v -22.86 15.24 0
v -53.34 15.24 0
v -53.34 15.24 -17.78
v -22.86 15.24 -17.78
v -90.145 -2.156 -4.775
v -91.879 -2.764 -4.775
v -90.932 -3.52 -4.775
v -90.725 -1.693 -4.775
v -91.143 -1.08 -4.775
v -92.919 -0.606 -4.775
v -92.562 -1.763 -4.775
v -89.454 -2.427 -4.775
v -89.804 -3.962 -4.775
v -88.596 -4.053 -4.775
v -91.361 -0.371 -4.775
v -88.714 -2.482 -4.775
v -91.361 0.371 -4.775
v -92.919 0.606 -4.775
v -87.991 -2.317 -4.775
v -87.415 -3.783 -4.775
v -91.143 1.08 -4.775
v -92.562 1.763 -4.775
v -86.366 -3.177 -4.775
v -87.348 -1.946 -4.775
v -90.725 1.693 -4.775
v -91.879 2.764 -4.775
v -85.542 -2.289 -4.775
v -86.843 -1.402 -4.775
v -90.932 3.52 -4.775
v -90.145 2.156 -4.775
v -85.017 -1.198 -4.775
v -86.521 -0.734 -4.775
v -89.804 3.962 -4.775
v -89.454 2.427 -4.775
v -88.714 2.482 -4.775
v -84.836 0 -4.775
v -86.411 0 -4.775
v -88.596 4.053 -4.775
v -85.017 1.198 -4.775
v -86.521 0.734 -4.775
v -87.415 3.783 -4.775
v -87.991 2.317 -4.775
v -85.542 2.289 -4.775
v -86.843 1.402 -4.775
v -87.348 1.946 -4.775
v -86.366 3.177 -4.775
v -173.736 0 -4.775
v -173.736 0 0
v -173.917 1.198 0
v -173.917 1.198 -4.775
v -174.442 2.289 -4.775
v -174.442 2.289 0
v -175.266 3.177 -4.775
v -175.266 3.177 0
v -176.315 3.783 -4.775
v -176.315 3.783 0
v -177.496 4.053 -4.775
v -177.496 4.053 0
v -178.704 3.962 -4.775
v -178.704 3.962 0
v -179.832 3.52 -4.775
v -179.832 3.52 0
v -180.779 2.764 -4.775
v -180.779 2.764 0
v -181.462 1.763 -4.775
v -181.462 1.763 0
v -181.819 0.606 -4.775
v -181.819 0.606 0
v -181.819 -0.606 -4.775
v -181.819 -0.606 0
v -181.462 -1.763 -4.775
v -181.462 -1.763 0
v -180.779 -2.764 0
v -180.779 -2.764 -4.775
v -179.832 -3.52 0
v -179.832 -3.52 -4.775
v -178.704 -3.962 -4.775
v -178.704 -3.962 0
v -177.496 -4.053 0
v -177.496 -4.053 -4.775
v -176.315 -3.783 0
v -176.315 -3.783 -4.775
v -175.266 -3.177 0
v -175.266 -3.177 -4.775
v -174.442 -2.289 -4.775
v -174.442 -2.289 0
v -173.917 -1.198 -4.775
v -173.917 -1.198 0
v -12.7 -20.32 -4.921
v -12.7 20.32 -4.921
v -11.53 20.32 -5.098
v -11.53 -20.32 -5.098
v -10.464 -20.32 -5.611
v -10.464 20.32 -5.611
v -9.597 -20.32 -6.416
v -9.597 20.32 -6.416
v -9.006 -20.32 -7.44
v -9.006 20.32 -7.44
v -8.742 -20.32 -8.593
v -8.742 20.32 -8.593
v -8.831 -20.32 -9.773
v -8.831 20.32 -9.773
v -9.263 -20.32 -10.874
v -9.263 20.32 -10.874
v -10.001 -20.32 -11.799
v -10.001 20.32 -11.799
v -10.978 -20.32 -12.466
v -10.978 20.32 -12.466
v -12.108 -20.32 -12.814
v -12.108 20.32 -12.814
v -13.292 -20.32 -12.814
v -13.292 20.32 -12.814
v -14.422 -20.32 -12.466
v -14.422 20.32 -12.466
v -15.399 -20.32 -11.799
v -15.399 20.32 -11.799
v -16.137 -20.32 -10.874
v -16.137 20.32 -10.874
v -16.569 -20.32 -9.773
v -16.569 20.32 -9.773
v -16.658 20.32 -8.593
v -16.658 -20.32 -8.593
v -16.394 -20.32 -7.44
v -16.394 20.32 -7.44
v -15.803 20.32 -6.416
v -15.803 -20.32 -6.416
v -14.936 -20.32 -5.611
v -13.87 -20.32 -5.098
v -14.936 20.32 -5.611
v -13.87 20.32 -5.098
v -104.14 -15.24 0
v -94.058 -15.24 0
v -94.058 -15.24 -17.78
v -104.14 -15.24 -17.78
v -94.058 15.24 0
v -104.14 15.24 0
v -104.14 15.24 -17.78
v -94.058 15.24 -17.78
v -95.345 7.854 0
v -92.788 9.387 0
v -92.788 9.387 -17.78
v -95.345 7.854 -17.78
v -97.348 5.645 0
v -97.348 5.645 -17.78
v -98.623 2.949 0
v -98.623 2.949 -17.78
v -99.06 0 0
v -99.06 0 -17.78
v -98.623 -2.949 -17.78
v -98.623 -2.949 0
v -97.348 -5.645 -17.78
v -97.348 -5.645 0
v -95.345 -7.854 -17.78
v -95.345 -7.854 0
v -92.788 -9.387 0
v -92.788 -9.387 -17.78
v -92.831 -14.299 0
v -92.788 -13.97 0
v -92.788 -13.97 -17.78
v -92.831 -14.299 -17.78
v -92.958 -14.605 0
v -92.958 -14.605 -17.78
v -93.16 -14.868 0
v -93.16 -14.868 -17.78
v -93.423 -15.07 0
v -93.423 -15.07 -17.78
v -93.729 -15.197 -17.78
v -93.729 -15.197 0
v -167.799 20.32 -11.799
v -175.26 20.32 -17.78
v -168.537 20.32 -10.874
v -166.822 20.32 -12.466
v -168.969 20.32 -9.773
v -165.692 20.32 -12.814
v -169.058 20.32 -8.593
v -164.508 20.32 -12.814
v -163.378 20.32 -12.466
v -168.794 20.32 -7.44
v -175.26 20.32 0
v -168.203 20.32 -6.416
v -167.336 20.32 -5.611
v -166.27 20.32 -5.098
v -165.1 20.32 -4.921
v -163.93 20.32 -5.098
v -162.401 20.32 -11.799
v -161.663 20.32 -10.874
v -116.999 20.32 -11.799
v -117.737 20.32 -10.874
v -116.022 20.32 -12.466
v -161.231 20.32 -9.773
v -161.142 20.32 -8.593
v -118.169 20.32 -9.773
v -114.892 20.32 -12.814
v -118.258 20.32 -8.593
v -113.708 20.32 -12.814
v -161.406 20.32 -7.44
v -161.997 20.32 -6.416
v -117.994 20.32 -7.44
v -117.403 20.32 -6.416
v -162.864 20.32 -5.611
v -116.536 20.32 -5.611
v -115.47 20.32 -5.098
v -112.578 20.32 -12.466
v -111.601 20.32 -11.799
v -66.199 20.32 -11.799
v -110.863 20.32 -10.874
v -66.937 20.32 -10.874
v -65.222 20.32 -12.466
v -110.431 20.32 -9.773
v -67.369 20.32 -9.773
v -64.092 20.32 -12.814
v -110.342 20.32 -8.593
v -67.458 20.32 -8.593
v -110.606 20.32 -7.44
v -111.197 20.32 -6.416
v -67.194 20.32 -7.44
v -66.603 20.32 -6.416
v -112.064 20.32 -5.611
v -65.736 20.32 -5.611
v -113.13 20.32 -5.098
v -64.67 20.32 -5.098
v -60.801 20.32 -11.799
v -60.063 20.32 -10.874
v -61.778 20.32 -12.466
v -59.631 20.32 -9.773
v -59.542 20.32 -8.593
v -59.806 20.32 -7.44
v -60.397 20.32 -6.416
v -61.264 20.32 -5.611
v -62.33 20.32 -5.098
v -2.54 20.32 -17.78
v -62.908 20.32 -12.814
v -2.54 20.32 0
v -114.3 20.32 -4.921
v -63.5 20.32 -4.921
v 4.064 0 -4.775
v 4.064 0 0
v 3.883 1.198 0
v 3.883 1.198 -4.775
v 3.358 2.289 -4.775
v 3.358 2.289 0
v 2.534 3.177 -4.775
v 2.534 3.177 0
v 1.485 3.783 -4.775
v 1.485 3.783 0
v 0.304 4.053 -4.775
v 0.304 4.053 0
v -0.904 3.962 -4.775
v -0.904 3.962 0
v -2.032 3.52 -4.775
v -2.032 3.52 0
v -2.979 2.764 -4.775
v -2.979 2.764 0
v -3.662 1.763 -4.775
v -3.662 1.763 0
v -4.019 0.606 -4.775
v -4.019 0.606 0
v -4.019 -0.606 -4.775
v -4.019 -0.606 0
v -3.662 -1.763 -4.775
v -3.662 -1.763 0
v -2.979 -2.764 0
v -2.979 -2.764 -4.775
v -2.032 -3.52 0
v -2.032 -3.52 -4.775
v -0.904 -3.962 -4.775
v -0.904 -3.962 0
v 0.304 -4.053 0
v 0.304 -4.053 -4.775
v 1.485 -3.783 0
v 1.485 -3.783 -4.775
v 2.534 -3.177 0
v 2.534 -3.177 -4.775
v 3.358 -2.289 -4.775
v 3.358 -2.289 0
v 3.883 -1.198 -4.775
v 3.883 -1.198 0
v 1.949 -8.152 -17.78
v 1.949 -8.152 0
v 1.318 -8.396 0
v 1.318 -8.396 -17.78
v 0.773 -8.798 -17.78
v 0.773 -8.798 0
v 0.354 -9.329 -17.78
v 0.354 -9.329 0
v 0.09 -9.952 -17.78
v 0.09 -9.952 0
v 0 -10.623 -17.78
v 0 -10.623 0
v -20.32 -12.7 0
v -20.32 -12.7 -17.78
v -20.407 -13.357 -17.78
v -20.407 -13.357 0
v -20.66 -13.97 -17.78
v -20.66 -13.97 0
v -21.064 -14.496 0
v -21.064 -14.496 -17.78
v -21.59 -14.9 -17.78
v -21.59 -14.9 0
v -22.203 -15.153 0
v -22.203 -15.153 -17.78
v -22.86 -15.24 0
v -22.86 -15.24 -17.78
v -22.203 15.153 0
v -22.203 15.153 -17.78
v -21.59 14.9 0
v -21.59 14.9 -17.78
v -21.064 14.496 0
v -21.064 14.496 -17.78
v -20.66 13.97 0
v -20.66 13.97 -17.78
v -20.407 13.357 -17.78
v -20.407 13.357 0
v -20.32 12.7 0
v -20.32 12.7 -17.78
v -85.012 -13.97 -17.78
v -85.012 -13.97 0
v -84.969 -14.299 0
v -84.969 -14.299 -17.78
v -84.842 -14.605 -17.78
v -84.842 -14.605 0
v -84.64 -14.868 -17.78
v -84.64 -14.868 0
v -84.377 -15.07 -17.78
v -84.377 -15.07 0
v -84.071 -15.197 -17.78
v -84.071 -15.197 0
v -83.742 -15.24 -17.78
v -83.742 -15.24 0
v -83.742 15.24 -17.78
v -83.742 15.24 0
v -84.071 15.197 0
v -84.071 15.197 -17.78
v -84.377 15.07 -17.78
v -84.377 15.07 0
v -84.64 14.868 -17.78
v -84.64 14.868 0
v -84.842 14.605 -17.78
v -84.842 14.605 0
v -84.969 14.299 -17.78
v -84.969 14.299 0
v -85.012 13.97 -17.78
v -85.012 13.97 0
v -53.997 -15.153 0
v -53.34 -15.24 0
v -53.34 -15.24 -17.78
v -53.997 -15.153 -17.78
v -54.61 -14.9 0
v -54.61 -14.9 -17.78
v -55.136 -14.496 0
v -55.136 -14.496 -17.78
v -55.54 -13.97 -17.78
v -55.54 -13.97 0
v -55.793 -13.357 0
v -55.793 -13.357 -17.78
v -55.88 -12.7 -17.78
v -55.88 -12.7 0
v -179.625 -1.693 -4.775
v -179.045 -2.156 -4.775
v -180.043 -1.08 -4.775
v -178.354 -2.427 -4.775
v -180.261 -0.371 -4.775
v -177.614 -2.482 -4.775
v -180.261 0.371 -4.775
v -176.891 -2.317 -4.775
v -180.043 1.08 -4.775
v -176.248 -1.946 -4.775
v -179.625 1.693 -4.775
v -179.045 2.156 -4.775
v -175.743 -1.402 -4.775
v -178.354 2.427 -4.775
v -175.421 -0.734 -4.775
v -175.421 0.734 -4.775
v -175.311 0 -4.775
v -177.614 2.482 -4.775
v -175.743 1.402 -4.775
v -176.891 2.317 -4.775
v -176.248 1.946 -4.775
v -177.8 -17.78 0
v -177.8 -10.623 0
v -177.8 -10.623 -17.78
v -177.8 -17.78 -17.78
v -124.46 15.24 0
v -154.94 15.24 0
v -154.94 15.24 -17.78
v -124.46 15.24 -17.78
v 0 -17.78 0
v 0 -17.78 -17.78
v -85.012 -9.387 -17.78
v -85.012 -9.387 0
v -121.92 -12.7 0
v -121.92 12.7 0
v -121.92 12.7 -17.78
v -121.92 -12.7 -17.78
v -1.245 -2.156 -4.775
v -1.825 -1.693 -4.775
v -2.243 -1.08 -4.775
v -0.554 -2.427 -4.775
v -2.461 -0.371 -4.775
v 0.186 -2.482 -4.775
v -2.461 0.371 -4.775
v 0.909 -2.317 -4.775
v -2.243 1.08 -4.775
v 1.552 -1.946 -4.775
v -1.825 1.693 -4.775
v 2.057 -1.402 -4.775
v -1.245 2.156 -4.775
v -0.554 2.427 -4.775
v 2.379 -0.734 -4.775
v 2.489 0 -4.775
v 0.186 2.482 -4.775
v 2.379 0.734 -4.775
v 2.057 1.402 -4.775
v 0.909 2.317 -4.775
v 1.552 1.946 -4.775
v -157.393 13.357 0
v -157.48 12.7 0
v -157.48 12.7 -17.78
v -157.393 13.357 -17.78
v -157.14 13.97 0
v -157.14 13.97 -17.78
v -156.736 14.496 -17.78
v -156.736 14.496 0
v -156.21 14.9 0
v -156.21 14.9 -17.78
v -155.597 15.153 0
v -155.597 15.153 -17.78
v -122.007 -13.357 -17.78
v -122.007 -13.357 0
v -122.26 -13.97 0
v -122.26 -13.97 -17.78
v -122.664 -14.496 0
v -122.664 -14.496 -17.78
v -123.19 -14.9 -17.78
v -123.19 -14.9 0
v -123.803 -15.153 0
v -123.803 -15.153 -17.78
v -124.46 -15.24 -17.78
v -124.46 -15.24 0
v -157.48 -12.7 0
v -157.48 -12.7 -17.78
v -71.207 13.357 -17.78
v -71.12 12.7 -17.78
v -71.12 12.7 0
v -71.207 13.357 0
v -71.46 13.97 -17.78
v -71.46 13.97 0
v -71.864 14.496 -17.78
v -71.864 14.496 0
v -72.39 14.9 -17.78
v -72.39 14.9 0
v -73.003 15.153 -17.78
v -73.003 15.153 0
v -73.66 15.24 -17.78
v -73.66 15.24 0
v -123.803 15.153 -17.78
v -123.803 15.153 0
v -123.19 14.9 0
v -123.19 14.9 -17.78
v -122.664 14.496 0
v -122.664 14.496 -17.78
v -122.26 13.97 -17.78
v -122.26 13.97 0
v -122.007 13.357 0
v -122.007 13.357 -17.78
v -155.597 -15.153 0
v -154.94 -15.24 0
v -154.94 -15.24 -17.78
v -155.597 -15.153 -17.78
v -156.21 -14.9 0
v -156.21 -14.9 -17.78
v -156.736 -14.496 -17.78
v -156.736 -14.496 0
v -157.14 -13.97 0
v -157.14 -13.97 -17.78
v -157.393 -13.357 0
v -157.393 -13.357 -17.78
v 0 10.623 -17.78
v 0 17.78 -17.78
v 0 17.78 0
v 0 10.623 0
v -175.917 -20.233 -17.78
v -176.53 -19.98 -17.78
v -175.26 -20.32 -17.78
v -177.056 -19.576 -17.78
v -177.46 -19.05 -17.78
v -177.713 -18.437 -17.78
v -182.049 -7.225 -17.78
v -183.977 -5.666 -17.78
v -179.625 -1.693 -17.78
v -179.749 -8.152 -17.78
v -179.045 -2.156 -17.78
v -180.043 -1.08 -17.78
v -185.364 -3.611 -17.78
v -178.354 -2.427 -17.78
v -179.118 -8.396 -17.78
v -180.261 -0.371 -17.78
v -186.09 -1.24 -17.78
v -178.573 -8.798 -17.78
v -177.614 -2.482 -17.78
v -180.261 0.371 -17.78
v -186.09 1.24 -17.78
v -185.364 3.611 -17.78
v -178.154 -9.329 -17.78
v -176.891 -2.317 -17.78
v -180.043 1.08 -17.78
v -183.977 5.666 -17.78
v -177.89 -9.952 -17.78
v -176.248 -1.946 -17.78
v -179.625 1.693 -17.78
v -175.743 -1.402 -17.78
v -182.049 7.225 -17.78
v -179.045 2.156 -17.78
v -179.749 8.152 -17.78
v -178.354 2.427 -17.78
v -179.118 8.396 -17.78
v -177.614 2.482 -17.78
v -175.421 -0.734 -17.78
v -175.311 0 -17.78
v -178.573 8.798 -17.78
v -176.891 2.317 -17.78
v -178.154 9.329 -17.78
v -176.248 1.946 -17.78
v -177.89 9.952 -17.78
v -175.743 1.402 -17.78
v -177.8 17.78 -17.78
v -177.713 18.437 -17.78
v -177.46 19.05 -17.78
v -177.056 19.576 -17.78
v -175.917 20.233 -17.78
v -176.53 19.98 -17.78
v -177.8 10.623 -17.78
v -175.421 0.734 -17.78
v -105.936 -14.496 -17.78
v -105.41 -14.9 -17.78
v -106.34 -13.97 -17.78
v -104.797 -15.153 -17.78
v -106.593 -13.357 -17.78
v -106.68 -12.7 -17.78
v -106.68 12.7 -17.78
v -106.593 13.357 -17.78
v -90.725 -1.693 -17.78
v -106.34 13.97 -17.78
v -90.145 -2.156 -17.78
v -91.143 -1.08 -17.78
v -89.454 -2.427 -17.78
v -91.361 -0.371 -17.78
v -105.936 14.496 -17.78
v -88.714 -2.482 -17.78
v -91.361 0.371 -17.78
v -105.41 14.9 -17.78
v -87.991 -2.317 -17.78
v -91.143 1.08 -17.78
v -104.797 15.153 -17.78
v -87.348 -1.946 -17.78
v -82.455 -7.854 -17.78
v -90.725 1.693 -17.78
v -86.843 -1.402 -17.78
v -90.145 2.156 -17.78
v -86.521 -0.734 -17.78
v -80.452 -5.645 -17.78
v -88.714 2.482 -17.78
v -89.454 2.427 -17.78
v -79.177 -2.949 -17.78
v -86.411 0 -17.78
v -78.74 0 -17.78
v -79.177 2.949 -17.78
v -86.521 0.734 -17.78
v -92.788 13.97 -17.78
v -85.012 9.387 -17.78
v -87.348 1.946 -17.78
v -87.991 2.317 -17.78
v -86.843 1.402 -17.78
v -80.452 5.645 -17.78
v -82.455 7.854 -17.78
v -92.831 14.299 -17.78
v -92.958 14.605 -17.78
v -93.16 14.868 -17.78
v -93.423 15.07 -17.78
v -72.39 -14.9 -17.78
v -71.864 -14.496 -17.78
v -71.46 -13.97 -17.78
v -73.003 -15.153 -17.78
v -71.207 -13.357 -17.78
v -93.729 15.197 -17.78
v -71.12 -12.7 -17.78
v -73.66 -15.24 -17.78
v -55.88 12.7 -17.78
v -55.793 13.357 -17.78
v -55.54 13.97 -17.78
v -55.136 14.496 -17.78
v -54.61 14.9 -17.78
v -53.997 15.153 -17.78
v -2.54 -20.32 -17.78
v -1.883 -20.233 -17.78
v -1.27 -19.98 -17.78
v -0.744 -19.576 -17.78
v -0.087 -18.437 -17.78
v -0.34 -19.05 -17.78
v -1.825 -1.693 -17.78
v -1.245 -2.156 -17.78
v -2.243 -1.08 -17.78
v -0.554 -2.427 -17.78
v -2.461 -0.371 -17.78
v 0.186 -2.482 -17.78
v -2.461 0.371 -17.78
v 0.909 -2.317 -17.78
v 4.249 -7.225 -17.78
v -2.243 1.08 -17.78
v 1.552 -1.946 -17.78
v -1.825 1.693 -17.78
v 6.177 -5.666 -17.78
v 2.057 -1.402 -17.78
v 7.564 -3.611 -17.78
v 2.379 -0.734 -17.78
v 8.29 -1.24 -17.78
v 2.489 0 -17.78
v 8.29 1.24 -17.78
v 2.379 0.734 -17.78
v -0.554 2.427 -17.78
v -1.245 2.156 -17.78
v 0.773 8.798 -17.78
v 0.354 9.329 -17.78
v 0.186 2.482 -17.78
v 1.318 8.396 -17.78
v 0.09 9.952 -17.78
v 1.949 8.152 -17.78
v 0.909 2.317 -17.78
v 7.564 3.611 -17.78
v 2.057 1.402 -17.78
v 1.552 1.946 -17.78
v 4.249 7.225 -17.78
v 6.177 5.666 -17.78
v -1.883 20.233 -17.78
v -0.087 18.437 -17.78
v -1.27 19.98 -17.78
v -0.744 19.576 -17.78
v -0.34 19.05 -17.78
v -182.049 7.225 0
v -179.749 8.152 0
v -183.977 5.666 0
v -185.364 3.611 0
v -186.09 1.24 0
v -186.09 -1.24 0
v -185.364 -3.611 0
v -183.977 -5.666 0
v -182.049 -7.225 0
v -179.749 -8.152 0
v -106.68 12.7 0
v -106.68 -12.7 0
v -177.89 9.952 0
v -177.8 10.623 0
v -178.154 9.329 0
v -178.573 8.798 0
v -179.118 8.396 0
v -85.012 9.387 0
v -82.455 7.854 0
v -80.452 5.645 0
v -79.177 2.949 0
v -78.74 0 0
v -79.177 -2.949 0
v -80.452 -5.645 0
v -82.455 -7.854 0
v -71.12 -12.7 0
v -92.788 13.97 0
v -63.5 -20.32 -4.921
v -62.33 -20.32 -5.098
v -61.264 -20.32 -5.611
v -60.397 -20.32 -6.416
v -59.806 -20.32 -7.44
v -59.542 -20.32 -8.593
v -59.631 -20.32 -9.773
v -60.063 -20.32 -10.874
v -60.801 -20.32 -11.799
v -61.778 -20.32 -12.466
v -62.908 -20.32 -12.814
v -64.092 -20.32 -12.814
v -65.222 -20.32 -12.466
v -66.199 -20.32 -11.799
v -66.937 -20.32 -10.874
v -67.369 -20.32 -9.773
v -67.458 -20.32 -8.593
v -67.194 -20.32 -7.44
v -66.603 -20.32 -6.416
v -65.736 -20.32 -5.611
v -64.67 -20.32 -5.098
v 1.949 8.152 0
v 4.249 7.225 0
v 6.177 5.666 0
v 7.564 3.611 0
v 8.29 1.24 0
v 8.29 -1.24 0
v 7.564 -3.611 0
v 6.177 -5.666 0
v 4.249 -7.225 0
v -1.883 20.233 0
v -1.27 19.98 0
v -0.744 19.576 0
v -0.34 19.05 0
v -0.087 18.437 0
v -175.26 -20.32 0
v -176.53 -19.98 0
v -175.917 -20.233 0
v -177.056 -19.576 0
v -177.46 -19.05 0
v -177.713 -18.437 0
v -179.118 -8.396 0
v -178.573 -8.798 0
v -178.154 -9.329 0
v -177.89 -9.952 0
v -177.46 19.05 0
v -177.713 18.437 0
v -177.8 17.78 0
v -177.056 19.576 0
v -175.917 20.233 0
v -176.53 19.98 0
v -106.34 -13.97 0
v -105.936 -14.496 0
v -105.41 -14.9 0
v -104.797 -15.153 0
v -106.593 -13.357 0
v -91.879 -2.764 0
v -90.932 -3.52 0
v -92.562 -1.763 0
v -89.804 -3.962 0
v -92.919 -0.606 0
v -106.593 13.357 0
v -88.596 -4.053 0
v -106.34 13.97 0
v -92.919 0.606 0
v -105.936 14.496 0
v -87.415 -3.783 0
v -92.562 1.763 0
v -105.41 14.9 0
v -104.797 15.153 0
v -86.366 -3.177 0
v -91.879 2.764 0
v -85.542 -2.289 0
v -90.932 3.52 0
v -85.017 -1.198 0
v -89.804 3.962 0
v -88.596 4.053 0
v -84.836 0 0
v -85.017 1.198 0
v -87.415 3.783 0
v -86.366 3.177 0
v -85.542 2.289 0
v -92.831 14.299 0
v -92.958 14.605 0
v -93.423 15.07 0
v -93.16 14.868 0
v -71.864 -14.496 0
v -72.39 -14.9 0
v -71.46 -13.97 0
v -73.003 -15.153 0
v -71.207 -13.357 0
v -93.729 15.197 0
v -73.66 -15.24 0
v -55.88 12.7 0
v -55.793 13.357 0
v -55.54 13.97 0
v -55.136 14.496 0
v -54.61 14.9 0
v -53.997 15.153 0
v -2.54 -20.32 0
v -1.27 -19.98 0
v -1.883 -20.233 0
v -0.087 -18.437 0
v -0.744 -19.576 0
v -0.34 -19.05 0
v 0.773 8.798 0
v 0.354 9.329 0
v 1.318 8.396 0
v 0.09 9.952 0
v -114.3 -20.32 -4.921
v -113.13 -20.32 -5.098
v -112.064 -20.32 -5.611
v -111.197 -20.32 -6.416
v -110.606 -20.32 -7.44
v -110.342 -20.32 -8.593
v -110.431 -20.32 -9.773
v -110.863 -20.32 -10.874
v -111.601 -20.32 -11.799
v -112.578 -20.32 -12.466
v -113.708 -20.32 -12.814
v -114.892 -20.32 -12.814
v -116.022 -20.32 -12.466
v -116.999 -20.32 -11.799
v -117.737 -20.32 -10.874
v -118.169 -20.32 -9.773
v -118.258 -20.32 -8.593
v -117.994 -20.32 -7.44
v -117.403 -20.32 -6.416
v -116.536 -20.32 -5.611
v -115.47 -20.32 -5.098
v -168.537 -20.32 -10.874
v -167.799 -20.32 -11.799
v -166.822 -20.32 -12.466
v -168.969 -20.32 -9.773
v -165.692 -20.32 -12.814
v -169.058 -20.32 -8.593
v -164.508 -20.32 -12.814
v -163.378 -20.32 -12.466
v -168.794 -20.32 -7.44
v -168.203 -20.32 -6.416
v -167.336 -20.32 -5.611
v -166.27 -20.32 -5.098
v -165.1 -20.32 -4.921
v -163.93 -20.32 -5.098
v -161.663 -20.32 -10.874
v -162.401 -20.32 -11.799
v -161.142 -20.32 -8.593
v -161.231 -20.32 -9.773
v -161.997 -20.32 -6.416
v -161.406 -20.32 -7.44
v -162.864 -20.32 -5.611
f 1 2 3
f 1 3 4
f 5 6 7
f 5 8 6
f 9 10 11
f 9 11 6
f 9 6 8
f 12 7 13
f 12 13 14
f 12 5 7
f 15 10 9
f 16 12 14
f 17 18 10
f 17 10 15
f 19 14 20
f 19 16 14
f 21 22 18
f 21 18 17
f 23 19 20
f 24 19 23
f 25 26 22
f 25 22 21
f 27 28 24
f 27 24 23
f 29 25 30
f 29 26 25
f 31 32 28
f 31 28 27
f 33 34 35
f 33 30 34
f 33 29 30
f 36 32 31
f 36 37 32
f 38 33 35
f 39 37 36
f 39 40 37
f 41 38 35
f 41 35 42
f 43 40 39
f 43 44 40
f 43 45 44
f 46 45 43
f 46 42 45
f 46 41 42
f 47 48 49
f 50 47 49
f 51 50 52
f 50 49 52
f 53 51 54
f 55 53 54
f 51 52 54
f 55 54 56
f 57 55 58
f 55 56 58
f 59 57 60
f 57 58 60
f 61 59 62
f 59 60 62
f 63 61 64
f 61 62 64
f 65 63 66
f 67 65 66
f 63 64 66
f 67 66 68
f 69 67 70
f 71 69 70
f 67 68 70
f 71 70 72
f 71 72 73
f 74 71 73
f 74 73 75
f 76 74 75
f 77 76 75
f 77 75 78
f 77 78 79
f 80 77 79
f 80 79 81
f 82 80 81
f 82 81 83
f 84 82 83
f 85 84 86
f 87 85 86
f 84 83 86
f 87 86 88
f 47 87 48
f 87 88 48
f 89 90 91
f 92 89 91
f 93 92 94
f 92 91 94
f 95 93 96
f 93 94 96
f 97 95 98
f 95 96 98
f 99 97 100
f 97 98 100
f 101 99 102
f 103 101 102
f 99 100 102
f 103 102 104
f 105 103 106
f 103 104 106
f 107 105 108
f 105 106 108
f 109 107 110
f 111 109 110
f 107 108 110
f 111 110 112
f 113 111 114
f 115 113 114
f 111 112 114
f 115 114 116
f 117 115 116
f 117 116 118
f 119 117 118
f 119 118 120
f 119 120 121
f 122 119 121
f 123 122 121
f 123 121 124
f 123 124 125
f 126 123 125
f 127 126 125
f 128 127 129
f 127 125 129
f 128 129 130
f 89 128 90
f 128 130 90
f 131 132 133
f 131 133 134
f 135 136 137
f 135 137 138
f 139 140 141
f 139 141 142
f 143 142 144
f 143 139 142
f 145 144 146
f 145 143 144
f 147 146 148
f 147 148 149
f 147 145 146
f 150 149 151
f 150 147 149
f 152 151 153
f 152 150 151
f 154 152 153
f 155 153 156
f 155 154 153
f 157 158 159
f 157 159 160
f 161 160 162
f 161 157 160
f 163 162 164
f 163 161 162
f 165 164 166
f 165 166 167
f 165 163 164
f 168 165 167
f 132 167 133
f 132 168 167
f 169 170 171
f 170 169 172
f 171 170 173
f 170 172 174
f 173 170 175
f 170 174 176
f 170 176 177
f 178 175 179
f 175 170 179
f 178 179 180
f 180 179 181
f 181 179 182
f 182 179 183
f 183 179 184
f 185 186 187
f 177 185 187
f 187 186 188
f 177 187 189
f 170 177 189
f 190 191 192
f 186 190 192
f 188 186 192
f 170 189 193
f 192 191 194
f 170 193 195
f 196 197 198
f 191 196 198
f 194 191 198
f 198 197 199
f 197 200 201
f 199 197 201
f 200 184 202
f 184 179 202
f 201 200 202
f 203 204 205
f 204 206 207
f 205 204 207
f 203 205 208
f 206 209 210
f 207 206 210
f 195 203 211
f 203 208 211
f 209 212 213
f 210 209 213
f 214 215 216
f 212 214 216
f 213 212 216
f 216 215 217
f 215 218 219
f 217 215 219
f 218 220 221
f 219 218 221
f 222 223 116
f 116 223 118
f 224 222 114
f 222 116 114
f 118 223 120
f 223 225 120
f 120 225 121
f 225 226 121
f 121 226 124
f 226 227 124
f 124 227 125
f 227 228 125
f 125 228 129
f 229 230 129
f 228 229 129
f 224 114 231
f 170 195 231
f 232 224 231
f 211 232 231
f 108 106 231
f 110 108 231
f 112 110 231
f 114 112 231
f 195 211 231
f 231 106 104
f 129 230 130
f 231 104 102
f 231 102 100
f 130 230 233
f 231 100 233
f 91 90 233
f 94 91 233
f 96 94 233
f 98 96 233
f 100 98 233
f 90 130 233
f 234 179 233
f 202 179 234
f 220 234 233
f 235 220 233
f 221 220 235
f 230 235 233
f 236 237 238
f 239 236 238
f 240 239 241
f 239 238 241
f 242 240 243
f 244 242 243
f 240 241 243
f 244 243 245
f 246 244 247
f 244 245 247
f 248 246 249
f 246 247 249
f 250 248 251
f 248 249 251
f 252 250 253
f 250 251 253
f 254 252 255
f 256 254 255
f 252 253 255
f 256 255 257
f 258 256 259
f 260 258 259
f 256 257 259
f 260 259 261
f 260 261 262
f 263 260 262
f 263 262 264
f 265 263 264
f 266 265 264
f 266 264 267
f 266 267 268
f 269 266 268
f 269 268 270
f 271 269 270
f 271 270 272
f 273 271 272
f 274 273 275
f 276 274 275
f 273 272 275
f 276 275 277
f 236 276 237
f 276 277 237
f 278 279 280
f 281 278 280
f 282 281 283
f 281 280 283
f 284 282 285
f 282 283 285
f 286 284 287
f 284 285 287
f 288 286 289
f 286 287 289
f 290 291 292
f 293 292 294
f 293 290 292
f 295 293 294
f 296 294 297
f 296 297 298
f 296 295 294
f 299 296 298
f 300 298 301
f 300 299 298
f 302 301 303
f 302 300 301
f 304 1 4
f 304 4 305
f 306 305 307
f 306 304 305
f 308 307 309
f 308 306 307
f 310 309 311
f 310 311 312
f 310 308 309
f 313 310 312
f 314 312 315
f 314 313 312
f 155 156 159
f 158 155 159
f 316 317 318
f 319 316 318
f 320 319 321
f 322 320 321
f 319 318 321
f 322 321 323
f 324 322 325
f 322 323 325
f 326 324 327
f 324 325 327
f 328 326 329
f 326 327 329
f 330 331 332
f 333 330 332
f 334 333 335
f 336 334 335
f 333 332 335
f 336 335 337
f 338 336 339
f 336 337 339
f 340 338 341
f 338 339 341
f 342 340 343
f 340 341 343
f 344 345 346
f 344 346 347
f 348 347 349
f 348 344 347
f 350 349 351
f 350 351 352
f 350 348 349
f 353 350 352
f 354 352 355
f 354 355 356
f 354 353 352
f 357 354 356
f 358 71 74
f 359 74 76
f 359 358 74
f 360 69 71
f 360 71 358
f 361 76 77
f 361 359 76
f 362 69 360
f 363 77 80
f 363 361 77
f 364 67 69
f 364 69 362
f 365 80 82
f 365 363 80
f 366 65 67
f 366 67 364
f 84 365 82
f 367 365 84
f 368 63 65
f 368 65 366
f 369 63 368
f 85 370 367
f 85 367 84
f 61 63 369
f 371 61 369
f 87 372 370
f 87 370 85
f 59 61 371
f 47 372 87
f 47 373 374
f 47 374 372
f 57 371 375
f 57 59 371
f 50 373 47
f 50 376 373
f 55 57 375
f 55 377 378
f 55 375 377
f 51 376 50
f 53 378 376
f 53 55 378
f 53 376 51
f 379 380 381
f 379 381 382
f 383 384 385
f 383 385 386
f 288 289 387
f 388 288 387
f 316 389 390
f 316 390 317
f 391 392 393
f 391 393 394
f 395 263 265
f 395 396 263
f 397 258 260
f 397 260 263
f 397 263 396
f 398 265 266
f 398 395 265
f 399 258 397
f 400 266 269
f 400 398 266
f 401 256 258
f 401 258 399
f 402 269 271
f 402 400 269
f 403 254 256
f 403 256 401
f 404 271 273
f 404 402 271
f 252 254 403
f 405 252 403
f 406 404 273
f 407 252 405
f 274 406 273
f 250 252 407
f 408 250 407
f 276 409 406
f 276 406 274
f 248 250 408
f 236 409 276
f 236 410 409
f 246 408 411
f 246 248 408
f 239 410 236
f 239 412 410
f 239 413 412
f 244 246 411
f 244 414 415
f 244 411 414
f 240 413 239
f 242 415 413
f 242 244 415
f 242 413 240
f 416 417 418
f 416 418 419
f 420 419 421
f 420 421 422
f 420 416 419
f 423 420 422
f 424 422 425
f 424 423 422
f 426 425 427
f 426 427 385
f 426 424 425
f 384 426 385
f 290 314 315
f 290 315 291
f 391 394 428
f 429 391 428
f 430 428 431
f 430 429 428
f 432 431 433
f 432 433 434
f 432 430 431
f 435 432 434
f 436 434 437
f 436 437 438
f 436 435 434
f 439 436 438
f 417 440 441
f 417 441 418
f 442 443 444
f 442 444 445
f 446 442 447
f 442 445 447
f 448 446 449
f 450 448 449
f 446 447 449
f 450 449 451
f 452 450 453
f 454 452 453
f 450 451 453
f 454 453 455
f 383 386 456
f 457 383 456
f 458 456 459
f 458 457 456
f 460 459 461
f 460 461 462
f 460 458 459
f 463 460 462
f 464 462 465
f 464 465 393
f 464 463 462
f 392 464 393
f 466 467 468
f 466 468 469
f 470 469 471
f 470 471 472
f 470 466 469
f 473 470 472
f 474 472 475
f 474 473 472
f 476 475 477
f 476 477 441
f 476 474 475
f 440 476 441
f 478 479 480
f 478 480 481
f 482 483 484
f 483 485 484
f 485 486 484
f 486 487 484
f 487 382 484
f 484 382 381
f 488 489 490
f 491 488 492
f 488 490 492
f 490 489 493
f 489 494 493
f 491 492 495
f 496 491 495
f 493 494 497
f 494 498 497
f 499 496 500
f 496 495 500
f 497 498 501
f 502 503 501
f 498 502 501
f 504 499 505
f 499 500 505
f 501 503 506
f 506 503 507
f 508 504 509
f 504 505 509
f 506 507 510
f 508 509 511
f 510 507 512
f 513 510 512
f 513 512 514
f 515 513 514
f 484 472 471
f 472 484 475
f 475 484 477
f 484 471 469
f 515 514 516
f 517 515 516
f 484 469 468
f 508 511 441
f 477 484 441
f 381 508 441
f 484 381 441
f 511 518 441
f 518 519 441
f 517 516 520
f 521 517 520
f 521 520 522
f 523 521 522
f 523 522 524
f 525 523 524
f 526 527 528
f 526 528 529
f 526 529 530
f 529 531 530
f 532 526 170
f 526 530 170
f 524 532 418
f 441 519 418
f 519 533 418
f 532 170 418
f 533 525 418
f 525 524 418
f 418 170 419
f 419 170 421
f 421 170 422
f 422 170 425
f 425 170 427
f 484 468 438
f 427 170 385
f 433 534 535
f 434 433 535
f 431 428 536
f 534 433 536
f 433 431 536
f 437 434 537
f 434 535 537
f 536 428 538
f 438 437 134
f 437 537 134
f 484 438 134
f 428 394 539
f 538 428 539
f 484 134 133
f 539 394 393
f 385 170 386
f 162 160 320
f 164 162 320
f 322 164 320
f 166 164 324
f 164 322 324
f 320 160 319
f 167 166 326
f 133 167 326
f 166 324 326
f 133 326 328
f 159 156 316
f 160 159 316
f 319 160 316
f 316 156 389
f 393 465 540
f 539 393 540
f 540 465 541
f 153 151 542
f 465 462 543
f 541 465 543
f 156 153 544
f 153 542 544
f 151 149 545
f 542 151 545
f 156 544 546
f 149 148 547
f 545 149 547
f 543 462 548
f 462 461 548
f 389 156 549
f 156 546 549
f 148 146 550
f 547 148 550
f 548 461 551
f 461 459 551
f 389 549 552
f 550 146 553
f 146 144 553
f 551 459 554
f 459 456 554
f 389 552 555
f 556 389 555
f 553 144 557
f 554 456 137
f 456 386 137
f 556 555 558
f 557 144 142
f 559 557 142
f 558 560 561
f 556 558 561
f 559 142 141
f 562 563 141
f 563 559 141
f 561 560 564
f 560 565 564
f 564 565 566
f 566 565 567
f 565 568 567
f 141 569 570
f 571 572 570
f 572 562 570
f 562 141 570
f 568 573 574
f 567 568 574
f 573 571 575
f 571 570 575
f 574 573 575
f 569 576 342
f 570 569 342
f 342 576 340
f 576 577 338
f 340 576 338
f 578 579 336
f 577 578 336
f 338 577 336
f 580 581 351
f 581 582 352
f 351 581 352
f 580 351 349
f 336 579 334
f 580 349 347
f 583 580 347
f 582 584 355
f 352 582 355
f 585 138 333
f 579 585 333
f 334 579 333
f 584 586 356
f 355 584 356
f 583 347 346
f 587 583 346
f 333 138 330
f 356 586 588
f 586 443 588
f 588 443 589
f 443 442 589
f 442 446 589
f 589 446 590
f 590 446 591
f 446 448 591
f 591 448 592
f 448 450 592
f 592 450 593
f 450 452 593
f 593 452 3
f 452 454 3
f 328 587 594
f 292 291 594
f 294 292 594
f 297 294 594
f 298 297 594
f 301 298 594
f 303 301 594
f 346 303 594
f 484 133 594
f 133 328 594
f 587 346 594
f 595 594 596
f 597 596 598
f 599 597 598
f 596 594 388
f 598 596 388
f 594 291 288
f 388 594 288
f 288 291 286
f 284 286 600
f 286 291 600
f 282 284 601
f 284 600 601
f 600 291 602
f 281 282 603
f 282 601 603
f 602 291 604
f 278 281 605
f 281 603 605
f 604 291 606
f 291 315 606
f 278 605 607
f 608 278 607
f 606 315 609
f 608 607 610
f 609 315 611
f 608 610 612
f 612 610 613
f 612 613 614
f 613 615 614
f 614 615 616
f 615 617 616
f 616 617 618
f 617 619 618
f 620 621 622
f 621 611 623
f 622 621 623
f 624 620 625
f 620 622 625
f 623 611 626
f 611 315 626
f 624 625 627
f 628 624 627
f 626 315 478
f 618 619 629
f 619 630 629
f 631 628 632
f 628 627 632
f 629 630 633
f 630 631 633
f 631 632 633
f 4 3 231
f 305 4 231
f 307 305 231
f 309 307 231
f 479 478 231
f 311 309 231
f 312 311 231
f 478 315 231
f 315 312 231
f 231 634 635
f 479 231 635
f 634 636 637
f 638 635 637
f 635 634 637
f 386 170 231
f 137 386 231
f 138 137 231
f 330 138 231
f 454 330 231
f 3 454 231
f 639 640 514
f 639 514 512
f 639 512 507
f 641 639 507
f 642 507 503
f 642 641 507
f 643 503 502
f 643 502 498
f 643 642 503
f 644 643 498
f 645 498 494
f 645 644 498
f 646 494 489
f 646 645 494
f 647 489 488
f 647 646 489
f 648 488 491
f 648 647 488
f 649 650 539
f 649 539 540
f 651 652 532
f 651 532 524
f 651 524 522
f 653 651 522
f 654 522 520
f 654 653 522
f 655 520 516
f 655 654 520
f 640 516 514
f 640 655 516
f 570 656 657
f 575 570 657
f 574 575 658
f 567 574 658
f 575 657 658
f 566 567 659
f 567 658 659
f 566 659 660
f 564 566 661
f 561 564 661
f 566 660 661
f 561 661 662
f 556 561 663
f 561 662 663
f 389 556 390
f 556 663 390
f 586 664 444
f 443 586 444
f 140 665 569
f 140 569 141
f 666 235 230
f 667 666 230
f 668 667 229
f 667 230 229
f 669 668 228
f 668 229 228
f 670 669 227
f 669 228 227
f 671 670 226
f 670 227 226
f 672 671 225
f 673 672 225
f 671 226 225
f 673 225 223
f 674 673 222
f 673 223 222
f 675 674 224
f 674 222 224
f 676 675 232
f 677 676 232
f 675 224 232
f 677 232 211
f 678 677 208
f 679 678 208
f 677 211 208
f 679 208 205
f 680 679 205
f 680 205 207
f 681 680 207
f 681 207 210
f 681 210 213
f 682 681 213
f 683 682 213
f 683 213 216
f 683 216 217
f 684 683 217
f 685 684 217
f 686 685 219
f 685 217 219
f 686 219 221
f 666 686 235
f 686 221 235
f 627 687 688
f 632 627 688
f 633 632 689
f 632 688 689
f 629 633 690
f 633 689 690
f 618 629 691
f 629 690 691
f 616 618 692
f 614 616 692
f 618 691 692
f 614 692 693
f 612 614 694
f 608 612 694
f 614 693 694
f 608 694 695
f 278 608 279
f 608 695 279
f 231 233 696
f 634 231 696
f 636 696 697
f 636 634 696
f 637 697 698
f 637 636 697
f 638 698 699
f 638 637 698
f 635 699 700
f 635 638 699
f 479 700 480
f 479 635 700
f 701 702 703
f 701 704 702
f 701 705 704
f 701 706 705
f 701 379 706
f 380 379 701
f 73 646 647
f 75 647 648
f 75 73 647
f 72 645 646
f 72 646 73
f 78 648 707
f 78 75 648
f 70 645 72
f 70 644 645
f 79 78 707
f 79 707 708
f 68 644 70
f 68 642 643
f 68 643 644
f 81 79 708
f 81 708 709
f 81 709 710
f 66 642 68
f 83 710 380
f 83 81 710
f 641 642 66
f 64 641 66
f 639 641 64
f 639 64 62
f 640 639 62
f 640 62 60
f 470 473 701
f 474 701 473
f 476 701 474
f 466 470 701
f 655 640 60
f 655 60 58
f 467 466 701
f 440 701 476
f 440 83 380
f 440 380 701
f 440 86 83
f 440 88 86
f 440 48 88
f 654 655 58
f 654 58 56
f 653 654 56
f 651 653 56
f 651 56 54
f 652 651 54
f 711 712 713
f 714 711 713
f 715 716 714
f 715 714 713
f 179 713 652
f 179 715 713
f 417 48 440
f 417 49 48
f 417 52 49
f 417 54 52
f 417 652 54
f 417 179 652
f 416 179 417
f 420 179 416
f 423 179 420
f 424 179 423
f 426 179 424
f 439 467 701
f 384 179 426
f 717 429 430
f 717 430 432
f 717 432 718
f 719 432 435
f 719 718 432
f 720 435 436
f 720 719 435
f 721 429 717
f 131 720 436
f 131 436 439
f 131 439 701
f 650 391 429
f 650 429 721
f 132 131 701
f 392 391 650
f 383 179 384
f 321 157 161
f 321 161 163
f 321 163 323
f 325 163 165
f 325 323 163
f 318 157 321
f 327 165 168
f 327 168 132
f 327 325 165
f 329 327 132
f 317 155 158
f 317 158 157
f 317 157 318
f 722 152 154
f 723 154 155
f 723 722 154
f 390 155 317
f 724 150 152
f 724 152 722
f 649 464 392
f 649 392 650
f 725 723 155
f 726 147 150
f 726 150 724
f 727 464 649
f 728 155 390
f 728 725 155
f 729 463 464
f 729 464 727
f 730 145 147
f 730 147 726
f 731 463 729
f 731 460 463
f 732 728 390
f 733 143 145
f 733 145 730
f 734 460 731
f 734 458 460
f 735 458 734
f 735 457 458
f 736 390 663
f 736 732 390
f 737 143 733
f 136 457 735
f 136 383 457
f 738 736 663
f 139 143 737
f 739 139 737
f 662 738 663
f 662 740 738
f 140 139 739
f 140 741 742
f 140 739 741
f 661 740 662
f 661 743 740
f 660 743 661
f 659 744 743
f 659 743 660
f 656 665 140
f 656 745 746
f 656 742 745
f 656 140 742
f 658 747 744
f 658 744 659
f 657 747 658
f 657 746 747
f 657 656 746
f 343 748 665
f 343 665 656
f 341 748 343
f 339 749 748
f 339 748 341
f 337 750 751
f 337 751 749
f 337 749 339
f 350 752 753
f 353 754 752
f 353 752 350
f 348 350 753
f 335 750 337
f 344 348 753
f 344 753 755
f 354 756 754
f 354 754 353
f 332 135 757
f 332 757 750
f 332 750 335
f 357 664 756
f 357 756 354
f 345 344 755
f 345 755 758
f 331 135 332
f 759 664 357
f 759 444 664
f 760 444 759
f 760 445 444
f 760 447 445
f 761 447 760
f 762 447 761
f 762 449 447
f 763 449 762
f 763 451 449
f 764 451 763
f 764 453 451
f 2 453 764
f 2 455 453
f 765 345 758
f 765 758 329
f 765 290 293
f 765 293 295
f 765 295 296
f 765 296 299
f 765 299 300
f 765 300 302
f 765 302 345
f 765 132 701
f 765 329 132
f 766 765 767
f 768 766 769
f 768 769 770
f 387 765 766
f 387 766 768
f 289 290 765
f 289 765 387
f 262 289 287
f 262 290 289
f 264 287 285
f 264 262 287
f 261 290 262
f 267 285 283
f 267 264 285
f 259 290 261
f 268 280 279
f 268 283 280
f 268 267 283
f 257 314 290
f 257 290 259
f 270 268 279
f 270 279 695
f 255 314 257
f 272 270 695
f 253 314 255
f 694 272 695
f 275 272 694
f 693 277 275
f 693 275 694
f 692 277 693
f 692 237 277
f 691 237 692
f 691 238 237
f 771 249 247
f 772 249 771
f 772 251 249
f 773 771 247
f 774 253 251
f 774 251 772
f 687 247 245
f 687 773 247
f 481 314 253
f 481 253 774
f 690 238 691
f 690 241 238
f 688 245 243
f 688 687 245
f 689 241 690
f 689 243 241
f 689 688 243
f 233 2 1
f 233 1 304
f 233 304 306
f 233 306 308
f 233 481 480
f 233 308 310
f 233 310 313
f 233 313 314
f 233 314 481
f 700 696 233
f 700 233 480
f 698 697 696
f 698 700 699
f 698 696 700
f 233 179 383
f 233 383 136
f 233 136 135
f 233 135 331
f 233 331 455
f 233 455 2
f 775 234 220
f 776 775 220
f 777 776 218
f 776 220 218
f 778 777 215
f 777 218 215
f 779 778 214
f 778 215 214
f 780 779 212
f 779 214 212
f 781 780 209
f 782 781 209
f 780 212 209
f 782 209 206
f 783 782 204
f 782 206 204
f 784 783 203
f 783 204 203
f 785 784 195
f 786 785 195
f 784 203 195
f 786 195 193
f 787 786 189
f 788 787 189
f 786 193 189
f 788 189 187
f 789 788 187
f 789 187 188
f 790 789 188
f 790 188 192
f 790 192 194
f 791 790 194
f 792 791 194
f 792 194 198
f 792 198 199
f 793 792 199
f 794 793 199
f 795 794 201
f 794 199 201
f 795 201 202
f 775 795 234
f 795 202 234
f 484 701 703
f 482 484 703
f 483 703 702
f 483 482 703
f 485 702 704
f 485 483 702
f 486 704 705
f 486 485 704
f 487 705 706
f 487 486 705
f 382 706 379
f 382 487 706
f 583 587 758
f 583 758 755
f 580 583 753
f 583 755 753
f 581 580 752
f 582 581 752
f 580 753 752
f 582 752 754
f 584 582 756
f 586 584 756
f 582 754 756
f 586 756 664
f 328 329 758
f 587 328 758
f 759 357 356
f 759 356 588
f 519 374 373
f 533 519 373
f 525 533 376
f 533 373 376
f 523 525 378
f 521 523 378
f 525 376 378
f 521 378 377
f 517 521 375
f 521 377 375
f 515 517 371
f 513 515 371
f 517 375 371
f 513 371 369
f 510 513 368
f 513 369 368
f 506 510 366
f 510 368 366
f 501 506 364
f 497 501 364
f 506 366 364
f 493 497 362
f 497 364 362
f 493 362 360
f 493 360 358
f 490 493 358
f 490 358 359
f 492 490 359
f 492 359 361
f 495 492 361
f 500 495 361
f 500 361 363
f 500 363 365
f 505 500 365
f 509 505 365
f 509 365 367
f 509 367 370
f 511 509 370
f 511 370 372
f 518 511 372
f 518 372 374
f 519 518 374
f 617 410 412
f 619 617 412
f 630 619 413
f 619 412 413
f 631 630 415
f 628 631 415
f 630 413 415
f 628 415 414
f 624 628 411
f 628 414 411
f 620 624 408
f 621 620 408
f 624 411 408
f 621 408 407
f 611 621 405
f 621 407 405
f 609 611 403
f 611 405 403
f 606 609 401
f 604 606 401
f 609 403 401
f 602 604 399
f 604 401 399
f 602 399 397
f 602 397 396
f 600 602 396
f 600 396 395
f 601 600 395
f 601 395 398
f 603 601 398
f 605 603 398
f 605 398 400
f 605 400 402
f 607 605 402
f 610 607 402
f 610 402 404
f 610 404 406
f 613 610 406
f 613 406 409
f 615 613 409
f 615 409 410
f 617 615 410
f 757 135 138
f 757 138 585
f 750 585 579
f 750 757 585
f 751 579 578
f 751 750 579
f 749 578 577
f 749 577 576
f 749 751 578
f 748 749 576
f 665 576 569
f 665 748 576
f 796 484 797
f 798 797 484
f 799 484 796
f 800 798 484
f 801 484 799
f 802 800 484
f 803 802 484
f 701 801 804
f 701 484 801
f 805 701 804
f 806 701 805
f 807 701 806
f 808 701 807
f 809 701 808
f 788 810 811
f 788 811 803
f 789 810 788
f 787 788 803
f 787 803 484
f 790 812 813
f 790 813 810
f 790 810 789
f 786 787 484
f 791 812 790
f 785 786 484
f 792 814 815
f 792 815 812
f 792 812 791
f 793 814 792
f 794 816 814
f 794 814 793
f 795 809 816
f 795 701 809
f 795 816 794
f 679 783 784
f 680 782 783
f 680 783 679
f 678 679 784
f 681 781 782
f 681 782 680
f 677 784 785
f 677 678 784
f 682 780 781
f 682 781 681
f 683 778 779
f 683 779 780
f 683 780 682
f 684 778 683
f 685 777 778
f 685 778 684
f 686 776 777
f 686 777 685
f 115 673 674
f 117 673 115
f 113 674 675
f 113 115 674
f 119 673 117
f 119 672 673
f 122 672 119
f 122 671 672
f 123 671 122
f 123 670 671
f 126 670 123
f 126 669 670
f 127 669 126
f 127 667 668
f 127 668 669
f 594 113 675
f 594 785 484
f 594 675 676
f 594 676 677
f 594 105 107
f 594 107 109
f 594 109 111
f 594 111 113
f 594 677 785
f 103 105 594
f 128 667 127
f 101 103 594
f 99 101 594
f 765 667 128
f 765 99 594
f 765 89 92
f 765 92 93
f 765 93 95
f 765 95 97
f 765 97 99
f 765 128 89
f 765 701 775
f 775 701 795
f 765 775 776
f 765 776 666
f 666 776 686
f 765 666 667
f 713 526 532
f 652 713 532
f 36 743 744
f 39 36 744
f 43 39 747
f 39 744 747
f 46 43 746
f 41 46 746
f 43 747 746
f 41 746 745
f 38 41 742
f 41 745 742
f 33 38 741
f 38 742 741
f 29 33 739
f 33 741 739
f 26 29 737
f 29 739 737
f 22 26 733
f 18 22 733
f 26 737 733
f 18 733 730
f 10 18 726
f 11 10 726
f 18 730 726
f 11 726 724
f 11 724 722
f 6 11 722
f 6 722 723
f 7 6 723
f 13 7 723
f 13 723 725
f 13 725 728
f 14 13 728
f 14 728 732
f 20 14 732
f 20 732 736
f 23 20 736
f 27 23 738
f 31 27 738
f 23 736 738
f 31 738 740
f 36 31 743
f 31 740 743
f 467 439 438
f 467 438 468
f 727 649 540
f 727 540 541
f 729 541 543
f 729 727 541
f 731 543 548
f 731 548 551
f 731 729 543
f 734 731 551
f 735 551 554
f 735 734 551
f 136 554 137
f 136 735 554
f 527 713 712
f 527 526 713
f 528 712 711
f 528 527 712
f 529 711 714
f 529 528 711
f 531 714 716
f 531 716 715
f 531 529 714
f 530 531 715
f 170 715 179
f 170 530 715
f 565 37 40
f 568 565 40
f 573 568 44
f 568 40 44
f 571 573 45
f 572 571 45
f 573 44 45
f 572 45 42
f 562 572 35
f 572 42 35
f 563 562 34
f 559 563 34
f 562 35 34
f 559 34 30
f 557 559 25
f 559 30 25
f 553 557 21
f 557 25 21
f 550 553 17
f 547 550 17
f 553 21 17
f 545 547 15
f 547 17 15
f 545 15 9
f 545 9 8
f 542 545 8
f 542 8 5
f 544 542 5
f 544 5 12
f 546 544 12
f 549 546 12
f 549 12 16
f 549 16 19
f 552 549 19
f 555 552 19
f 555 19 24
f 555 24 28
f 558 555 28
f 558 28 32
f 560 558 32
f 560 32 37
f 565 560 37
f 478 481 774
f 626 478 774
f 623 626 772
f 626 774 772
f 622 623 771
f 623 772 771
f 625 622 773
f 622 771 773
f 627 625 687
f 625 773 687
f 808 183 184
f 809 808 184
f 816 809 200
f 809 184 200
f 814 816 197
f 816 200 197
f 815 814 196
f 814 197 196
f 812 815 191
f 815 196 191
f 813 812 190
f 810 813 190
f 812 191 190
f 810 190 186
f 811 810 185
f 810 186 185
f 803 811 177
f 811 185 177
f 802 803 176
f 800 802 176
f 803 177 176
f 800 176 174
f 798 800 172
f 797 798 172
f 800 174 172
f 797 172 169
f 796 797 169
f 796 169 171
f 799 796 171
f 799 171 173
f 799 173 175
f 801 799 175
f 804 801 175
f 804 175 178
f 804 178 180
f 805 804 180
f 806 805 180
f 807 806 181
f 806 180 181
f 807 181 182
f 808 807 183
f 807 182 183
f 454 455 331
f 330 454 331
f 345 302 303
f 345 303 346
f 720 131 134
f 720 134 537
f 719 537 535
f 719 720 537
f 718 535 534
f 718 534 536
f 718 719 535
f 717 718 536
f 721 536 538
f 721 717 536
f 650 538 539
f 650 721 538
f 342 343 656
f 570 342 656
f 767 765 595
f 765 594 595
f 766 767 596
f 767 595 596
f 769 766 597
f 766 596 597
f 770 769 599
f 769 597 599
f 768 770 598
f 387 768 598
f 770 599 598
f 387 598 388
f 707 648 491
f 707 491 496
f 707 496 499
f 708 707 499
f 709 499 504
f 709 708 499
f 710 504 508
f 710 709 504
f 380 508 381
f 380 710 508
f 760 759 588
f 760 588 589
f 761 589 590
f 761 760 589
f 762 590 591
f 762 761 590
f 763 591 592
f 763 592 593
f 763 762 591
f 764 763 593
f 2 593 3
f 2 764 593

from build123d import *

# Parameters (mm, degrees)
SKETCH1_W           = 195.2625
SKETCH1_H           = 40.64
SKETCH1_R           = 2.4892
BOSS_EXTRUDE1_DEPTH = 17.78
SKETCH2_R           = 3.96875
CUT_EXTRUDE1_DEPTH  = 40.64
SKETCH3_R           = 4.064
CUT_EXTRUDE2_DEPTH  = 4.7752
CUT_EXTRUDE3_DEPTH  = 17.78
FILLET1_R           = 2.54


with BuildPart() as part:
    # Sketch1 → Boss-Extrude1 (new body)
    with BuildSketch(Plane.XY):
        with Locations((-88.9, 0)):
            Rectangle(SKETCH1_W, SKETCH1_H)
        Circle(SKETCH1_R, mode=Mode.SUBTRACT)
        with Locations((-177.8, 0)):
            Circle(SKETCH1_R, mode=Mode.SUBTRACT)
        with Locations((-88.9, 0)):
            Circle(SKETCH1_R, mode=Mode.SUBTRACT)
    extrude(amount=-BOSS_EXTRUDE1_DEPTH)

    # Sketch2 → Cut-Extrude1 (cut)
    with BuildSketch(Plane(origin=(0, 20.32, 0), x_dir=(1, 0, 0), z_dir=(0, 1, 0))):
        with Locations(Location((-12.7, 8.89, 0), (0, 0, 270))):
            Circle(SKETCH2_R)
        with Locations(Location((-63.5, 8.89, 0), (0, 0, 270))):
            Circle(SKETCH2_R)
        with Locations(Location((-114.3, 8.89, 0), (0, 0, 270))):
            Circle(SKETCH2_R)
        with Locations(Location((-165.1, 8.89, 0), (0, 0, 270))):
            Circle(SKETCH2_R)
    extrude(amount=-CUT_EXTRUDE1_DEPTH, mode=Mode.SUBTRACT)

    # Sketch3 → Cut-Extrude2 (cut)
    with BuildSketch(Plane.XY):
        Circle(SKETCH3_R)
        with Locations((-88.9, 0)):
            Circle(SKETCH3_R)
        with Locations((-177.8, 0)):
            Circle(SKETCH3_R)
    extrude(amount=-CUT_EXTRUDE2_DEPTH, mode=Mode.SUBTRACT)

    # Sketch5 → Cut-Extrude3 (cut)
    with BuildSketch(Plane.XY):
        with BuildLine():
            Line((0, -20.32), (8.73125, -20.32))
            Line((8.73125, -20.32), (8.73125, 20.32))
            Line((8.73125, 20.32), (0, 20.32))
            Line((0, 20.32), (0, 10.622546022))
            ThreePointArc((0, 10.622546022), (0.546012526, 9.049137635), (1.949302326, 8.152186482))
            ThreePointArc((1.949302326, 8.152186482), (8.382, 0), (1.949302326, -8.152186482))
            ThreePointArc((1.949302326, -8.152186482), (0.546012526, -9.049137635), (0, -10.622546022))
            Line((0, -10.622546022), (0, -20.32))
        make_face()
        with BuildLine():
            Line((-22.86, -15.24), (-53.34, -15.24))
            ThreePointArc((-53.34, -15.24), (-55.136051224, -14.496051224), (-55.88, -12.7))
            Line((-55.88, -12.7), (-55.88, 12.7))
            ThreePointArc((-55.88, 12.7), (-55.136051224, 14.496051224), (-53.34, 15.24))
            Line((-53.34, 15.24), (-22.86, 15.24))
            ThreePointArc((-22.86, 15.24), (-21.063948776, 14.496051224), (-20.32, 12.7))
            Line((-20.32, 12.7), (-20.32, -12.7))
            ThreePointArc((-20.32, -12.7), (-21.063948776, -14.496051224), (-22.86, -15.24))
        make_face()
        with BuildLine():
            Line((-85.011936327, -9.38661605), (-85.011936327, -13.97))
            ThreePointArc((-85.011936327, -13.97), (-84.639961939, -14.868025612), (-83.741936327, -15.24))
            Line((-83.741936327, -15.24), (-73.66, -15.24))
            ThreePointArc((-73.66, -15.24), (-71.863948776, -14.496051224), (-71.12, -12.7))
            Line((-71.12, -12.7), (-71.12, 12.7))
            ThreePointArc((-71.12, 12.7), (-71.863948776, 14.496051224), (-73.66, 15.24))
            Line((-73.66, 15.24), (-83.741936327, 15.24))
            ThreePointArc((-83.741936327, 15.24), (-84.639961939, 14.868025612), (-85.011936327, 13.97))
            Line((-85.011936327, 13.97), (-85.011936327, 9.38661605))
            ThreePointArc((-85.011936327, 9.38661605), (-78.74, 0), (-85.011936327, -9.38661605))
        make_face()
        with BuildLine():
            Line((-104.14, 15.24), (-94.058063673, 15.24))
            ThreePointArc((-94.058063673, 15.24), (-93.160038061, 14.868025612), (-92.788063673, 13.97))
            Line((-92.788063673, 13.97), (-92.788063673, 9.38661605))
            ThreePointArc((-92.788063673, 9.38661605), (-99.06, 0), (-92.788063673, -9.38661605))
            Line((-92.788063673, -9.38661605), (-92.788063673, -13.97))
            ThreePointArc((-92.788063673, -13.97), (-93.160038061, -14.868025612), (-94.058063673, -15.24))
            Line((-94.058063673, -15.24), (-104.14, -15.24))
            ThreePointArc((-104.14, -15.24), (-105.936051224, -14.496051224), (-106.68, -12.7))
            Line((-106.68, -12.7), (-106.68, 12.7))
            ThreePointArc((-106.68, 12.7), (-105.936051224, 14.496051224), (-104.14, 15.24))
        make_face()
        with BuildLine():
            Line((-154.94, 15.24), (-124.46, 15.24))
            ThreePointArc((-124.46, 15.24), (-122.663948776, 14.496051224), (-121.92, 12.7))
            Line((-121.92, 12.7), (-121.92, -12.7))
            ThreePointArc((-121.92, -12.7), (-122.663948776, -14.496051224), (-124.46, -15.24))
            Line((-124.46, -15.24), (-154.94, -15.24))
            ThreePointArc((-154.94, -15.24), (-156.736051224, -14.496051224), (-157.48, -12.7))
            Line((-157.48, -12.7), (-157.48, 12.7))
            ThreePointArc((-157.48, 12.7), (-156.736051224, 14.496051224), (-154.94, 15.24))
        make_face()
        with BuildLine():
            Line((-186.53125, -20.32), (-186.53125, 20.32))
            Line((-186.53125, 20.32), (-177.8, 20.32))
            Line((-177.8, 20.32), (-177.8, 10.622546022))
            ThreePointArc((-177.8, 10.622546022), (-178.346012526, 9.049137635), (-179.749302326, 8.152186482))
            ThreePointArc((-179.749302326, 8.152186482), (-186.182, 0), (-179.749302326, -8.152186482))
            ThreePointArc((-179.749302326, -8.152186482), (-178.346012526, -9.049137635), (-177.8, -10.622546022))
            Line((-177.8, -10.622546022), (-177.8, -20.32))
            Line((-177.8, -20.32), (-186.53125, -20.32))
        make_face()
    extrude(amount=-CUT_EXTRUDE3_DEPTH, mode=Mode.SUBTRACT)

    # Fillet1
    fillet1_edges = [part.edges().sort_by_distance(p)[0] for p in [
        (0, 20.32, -8.89),
        (0, -20.32, -8.89),
        (-177.8, -20.32, -8.89),
        (-177.8, 20.32, -8.89),
    ]]
    fillet(fillet1_edges, radius=FILLET1_R)


solid = part.part
